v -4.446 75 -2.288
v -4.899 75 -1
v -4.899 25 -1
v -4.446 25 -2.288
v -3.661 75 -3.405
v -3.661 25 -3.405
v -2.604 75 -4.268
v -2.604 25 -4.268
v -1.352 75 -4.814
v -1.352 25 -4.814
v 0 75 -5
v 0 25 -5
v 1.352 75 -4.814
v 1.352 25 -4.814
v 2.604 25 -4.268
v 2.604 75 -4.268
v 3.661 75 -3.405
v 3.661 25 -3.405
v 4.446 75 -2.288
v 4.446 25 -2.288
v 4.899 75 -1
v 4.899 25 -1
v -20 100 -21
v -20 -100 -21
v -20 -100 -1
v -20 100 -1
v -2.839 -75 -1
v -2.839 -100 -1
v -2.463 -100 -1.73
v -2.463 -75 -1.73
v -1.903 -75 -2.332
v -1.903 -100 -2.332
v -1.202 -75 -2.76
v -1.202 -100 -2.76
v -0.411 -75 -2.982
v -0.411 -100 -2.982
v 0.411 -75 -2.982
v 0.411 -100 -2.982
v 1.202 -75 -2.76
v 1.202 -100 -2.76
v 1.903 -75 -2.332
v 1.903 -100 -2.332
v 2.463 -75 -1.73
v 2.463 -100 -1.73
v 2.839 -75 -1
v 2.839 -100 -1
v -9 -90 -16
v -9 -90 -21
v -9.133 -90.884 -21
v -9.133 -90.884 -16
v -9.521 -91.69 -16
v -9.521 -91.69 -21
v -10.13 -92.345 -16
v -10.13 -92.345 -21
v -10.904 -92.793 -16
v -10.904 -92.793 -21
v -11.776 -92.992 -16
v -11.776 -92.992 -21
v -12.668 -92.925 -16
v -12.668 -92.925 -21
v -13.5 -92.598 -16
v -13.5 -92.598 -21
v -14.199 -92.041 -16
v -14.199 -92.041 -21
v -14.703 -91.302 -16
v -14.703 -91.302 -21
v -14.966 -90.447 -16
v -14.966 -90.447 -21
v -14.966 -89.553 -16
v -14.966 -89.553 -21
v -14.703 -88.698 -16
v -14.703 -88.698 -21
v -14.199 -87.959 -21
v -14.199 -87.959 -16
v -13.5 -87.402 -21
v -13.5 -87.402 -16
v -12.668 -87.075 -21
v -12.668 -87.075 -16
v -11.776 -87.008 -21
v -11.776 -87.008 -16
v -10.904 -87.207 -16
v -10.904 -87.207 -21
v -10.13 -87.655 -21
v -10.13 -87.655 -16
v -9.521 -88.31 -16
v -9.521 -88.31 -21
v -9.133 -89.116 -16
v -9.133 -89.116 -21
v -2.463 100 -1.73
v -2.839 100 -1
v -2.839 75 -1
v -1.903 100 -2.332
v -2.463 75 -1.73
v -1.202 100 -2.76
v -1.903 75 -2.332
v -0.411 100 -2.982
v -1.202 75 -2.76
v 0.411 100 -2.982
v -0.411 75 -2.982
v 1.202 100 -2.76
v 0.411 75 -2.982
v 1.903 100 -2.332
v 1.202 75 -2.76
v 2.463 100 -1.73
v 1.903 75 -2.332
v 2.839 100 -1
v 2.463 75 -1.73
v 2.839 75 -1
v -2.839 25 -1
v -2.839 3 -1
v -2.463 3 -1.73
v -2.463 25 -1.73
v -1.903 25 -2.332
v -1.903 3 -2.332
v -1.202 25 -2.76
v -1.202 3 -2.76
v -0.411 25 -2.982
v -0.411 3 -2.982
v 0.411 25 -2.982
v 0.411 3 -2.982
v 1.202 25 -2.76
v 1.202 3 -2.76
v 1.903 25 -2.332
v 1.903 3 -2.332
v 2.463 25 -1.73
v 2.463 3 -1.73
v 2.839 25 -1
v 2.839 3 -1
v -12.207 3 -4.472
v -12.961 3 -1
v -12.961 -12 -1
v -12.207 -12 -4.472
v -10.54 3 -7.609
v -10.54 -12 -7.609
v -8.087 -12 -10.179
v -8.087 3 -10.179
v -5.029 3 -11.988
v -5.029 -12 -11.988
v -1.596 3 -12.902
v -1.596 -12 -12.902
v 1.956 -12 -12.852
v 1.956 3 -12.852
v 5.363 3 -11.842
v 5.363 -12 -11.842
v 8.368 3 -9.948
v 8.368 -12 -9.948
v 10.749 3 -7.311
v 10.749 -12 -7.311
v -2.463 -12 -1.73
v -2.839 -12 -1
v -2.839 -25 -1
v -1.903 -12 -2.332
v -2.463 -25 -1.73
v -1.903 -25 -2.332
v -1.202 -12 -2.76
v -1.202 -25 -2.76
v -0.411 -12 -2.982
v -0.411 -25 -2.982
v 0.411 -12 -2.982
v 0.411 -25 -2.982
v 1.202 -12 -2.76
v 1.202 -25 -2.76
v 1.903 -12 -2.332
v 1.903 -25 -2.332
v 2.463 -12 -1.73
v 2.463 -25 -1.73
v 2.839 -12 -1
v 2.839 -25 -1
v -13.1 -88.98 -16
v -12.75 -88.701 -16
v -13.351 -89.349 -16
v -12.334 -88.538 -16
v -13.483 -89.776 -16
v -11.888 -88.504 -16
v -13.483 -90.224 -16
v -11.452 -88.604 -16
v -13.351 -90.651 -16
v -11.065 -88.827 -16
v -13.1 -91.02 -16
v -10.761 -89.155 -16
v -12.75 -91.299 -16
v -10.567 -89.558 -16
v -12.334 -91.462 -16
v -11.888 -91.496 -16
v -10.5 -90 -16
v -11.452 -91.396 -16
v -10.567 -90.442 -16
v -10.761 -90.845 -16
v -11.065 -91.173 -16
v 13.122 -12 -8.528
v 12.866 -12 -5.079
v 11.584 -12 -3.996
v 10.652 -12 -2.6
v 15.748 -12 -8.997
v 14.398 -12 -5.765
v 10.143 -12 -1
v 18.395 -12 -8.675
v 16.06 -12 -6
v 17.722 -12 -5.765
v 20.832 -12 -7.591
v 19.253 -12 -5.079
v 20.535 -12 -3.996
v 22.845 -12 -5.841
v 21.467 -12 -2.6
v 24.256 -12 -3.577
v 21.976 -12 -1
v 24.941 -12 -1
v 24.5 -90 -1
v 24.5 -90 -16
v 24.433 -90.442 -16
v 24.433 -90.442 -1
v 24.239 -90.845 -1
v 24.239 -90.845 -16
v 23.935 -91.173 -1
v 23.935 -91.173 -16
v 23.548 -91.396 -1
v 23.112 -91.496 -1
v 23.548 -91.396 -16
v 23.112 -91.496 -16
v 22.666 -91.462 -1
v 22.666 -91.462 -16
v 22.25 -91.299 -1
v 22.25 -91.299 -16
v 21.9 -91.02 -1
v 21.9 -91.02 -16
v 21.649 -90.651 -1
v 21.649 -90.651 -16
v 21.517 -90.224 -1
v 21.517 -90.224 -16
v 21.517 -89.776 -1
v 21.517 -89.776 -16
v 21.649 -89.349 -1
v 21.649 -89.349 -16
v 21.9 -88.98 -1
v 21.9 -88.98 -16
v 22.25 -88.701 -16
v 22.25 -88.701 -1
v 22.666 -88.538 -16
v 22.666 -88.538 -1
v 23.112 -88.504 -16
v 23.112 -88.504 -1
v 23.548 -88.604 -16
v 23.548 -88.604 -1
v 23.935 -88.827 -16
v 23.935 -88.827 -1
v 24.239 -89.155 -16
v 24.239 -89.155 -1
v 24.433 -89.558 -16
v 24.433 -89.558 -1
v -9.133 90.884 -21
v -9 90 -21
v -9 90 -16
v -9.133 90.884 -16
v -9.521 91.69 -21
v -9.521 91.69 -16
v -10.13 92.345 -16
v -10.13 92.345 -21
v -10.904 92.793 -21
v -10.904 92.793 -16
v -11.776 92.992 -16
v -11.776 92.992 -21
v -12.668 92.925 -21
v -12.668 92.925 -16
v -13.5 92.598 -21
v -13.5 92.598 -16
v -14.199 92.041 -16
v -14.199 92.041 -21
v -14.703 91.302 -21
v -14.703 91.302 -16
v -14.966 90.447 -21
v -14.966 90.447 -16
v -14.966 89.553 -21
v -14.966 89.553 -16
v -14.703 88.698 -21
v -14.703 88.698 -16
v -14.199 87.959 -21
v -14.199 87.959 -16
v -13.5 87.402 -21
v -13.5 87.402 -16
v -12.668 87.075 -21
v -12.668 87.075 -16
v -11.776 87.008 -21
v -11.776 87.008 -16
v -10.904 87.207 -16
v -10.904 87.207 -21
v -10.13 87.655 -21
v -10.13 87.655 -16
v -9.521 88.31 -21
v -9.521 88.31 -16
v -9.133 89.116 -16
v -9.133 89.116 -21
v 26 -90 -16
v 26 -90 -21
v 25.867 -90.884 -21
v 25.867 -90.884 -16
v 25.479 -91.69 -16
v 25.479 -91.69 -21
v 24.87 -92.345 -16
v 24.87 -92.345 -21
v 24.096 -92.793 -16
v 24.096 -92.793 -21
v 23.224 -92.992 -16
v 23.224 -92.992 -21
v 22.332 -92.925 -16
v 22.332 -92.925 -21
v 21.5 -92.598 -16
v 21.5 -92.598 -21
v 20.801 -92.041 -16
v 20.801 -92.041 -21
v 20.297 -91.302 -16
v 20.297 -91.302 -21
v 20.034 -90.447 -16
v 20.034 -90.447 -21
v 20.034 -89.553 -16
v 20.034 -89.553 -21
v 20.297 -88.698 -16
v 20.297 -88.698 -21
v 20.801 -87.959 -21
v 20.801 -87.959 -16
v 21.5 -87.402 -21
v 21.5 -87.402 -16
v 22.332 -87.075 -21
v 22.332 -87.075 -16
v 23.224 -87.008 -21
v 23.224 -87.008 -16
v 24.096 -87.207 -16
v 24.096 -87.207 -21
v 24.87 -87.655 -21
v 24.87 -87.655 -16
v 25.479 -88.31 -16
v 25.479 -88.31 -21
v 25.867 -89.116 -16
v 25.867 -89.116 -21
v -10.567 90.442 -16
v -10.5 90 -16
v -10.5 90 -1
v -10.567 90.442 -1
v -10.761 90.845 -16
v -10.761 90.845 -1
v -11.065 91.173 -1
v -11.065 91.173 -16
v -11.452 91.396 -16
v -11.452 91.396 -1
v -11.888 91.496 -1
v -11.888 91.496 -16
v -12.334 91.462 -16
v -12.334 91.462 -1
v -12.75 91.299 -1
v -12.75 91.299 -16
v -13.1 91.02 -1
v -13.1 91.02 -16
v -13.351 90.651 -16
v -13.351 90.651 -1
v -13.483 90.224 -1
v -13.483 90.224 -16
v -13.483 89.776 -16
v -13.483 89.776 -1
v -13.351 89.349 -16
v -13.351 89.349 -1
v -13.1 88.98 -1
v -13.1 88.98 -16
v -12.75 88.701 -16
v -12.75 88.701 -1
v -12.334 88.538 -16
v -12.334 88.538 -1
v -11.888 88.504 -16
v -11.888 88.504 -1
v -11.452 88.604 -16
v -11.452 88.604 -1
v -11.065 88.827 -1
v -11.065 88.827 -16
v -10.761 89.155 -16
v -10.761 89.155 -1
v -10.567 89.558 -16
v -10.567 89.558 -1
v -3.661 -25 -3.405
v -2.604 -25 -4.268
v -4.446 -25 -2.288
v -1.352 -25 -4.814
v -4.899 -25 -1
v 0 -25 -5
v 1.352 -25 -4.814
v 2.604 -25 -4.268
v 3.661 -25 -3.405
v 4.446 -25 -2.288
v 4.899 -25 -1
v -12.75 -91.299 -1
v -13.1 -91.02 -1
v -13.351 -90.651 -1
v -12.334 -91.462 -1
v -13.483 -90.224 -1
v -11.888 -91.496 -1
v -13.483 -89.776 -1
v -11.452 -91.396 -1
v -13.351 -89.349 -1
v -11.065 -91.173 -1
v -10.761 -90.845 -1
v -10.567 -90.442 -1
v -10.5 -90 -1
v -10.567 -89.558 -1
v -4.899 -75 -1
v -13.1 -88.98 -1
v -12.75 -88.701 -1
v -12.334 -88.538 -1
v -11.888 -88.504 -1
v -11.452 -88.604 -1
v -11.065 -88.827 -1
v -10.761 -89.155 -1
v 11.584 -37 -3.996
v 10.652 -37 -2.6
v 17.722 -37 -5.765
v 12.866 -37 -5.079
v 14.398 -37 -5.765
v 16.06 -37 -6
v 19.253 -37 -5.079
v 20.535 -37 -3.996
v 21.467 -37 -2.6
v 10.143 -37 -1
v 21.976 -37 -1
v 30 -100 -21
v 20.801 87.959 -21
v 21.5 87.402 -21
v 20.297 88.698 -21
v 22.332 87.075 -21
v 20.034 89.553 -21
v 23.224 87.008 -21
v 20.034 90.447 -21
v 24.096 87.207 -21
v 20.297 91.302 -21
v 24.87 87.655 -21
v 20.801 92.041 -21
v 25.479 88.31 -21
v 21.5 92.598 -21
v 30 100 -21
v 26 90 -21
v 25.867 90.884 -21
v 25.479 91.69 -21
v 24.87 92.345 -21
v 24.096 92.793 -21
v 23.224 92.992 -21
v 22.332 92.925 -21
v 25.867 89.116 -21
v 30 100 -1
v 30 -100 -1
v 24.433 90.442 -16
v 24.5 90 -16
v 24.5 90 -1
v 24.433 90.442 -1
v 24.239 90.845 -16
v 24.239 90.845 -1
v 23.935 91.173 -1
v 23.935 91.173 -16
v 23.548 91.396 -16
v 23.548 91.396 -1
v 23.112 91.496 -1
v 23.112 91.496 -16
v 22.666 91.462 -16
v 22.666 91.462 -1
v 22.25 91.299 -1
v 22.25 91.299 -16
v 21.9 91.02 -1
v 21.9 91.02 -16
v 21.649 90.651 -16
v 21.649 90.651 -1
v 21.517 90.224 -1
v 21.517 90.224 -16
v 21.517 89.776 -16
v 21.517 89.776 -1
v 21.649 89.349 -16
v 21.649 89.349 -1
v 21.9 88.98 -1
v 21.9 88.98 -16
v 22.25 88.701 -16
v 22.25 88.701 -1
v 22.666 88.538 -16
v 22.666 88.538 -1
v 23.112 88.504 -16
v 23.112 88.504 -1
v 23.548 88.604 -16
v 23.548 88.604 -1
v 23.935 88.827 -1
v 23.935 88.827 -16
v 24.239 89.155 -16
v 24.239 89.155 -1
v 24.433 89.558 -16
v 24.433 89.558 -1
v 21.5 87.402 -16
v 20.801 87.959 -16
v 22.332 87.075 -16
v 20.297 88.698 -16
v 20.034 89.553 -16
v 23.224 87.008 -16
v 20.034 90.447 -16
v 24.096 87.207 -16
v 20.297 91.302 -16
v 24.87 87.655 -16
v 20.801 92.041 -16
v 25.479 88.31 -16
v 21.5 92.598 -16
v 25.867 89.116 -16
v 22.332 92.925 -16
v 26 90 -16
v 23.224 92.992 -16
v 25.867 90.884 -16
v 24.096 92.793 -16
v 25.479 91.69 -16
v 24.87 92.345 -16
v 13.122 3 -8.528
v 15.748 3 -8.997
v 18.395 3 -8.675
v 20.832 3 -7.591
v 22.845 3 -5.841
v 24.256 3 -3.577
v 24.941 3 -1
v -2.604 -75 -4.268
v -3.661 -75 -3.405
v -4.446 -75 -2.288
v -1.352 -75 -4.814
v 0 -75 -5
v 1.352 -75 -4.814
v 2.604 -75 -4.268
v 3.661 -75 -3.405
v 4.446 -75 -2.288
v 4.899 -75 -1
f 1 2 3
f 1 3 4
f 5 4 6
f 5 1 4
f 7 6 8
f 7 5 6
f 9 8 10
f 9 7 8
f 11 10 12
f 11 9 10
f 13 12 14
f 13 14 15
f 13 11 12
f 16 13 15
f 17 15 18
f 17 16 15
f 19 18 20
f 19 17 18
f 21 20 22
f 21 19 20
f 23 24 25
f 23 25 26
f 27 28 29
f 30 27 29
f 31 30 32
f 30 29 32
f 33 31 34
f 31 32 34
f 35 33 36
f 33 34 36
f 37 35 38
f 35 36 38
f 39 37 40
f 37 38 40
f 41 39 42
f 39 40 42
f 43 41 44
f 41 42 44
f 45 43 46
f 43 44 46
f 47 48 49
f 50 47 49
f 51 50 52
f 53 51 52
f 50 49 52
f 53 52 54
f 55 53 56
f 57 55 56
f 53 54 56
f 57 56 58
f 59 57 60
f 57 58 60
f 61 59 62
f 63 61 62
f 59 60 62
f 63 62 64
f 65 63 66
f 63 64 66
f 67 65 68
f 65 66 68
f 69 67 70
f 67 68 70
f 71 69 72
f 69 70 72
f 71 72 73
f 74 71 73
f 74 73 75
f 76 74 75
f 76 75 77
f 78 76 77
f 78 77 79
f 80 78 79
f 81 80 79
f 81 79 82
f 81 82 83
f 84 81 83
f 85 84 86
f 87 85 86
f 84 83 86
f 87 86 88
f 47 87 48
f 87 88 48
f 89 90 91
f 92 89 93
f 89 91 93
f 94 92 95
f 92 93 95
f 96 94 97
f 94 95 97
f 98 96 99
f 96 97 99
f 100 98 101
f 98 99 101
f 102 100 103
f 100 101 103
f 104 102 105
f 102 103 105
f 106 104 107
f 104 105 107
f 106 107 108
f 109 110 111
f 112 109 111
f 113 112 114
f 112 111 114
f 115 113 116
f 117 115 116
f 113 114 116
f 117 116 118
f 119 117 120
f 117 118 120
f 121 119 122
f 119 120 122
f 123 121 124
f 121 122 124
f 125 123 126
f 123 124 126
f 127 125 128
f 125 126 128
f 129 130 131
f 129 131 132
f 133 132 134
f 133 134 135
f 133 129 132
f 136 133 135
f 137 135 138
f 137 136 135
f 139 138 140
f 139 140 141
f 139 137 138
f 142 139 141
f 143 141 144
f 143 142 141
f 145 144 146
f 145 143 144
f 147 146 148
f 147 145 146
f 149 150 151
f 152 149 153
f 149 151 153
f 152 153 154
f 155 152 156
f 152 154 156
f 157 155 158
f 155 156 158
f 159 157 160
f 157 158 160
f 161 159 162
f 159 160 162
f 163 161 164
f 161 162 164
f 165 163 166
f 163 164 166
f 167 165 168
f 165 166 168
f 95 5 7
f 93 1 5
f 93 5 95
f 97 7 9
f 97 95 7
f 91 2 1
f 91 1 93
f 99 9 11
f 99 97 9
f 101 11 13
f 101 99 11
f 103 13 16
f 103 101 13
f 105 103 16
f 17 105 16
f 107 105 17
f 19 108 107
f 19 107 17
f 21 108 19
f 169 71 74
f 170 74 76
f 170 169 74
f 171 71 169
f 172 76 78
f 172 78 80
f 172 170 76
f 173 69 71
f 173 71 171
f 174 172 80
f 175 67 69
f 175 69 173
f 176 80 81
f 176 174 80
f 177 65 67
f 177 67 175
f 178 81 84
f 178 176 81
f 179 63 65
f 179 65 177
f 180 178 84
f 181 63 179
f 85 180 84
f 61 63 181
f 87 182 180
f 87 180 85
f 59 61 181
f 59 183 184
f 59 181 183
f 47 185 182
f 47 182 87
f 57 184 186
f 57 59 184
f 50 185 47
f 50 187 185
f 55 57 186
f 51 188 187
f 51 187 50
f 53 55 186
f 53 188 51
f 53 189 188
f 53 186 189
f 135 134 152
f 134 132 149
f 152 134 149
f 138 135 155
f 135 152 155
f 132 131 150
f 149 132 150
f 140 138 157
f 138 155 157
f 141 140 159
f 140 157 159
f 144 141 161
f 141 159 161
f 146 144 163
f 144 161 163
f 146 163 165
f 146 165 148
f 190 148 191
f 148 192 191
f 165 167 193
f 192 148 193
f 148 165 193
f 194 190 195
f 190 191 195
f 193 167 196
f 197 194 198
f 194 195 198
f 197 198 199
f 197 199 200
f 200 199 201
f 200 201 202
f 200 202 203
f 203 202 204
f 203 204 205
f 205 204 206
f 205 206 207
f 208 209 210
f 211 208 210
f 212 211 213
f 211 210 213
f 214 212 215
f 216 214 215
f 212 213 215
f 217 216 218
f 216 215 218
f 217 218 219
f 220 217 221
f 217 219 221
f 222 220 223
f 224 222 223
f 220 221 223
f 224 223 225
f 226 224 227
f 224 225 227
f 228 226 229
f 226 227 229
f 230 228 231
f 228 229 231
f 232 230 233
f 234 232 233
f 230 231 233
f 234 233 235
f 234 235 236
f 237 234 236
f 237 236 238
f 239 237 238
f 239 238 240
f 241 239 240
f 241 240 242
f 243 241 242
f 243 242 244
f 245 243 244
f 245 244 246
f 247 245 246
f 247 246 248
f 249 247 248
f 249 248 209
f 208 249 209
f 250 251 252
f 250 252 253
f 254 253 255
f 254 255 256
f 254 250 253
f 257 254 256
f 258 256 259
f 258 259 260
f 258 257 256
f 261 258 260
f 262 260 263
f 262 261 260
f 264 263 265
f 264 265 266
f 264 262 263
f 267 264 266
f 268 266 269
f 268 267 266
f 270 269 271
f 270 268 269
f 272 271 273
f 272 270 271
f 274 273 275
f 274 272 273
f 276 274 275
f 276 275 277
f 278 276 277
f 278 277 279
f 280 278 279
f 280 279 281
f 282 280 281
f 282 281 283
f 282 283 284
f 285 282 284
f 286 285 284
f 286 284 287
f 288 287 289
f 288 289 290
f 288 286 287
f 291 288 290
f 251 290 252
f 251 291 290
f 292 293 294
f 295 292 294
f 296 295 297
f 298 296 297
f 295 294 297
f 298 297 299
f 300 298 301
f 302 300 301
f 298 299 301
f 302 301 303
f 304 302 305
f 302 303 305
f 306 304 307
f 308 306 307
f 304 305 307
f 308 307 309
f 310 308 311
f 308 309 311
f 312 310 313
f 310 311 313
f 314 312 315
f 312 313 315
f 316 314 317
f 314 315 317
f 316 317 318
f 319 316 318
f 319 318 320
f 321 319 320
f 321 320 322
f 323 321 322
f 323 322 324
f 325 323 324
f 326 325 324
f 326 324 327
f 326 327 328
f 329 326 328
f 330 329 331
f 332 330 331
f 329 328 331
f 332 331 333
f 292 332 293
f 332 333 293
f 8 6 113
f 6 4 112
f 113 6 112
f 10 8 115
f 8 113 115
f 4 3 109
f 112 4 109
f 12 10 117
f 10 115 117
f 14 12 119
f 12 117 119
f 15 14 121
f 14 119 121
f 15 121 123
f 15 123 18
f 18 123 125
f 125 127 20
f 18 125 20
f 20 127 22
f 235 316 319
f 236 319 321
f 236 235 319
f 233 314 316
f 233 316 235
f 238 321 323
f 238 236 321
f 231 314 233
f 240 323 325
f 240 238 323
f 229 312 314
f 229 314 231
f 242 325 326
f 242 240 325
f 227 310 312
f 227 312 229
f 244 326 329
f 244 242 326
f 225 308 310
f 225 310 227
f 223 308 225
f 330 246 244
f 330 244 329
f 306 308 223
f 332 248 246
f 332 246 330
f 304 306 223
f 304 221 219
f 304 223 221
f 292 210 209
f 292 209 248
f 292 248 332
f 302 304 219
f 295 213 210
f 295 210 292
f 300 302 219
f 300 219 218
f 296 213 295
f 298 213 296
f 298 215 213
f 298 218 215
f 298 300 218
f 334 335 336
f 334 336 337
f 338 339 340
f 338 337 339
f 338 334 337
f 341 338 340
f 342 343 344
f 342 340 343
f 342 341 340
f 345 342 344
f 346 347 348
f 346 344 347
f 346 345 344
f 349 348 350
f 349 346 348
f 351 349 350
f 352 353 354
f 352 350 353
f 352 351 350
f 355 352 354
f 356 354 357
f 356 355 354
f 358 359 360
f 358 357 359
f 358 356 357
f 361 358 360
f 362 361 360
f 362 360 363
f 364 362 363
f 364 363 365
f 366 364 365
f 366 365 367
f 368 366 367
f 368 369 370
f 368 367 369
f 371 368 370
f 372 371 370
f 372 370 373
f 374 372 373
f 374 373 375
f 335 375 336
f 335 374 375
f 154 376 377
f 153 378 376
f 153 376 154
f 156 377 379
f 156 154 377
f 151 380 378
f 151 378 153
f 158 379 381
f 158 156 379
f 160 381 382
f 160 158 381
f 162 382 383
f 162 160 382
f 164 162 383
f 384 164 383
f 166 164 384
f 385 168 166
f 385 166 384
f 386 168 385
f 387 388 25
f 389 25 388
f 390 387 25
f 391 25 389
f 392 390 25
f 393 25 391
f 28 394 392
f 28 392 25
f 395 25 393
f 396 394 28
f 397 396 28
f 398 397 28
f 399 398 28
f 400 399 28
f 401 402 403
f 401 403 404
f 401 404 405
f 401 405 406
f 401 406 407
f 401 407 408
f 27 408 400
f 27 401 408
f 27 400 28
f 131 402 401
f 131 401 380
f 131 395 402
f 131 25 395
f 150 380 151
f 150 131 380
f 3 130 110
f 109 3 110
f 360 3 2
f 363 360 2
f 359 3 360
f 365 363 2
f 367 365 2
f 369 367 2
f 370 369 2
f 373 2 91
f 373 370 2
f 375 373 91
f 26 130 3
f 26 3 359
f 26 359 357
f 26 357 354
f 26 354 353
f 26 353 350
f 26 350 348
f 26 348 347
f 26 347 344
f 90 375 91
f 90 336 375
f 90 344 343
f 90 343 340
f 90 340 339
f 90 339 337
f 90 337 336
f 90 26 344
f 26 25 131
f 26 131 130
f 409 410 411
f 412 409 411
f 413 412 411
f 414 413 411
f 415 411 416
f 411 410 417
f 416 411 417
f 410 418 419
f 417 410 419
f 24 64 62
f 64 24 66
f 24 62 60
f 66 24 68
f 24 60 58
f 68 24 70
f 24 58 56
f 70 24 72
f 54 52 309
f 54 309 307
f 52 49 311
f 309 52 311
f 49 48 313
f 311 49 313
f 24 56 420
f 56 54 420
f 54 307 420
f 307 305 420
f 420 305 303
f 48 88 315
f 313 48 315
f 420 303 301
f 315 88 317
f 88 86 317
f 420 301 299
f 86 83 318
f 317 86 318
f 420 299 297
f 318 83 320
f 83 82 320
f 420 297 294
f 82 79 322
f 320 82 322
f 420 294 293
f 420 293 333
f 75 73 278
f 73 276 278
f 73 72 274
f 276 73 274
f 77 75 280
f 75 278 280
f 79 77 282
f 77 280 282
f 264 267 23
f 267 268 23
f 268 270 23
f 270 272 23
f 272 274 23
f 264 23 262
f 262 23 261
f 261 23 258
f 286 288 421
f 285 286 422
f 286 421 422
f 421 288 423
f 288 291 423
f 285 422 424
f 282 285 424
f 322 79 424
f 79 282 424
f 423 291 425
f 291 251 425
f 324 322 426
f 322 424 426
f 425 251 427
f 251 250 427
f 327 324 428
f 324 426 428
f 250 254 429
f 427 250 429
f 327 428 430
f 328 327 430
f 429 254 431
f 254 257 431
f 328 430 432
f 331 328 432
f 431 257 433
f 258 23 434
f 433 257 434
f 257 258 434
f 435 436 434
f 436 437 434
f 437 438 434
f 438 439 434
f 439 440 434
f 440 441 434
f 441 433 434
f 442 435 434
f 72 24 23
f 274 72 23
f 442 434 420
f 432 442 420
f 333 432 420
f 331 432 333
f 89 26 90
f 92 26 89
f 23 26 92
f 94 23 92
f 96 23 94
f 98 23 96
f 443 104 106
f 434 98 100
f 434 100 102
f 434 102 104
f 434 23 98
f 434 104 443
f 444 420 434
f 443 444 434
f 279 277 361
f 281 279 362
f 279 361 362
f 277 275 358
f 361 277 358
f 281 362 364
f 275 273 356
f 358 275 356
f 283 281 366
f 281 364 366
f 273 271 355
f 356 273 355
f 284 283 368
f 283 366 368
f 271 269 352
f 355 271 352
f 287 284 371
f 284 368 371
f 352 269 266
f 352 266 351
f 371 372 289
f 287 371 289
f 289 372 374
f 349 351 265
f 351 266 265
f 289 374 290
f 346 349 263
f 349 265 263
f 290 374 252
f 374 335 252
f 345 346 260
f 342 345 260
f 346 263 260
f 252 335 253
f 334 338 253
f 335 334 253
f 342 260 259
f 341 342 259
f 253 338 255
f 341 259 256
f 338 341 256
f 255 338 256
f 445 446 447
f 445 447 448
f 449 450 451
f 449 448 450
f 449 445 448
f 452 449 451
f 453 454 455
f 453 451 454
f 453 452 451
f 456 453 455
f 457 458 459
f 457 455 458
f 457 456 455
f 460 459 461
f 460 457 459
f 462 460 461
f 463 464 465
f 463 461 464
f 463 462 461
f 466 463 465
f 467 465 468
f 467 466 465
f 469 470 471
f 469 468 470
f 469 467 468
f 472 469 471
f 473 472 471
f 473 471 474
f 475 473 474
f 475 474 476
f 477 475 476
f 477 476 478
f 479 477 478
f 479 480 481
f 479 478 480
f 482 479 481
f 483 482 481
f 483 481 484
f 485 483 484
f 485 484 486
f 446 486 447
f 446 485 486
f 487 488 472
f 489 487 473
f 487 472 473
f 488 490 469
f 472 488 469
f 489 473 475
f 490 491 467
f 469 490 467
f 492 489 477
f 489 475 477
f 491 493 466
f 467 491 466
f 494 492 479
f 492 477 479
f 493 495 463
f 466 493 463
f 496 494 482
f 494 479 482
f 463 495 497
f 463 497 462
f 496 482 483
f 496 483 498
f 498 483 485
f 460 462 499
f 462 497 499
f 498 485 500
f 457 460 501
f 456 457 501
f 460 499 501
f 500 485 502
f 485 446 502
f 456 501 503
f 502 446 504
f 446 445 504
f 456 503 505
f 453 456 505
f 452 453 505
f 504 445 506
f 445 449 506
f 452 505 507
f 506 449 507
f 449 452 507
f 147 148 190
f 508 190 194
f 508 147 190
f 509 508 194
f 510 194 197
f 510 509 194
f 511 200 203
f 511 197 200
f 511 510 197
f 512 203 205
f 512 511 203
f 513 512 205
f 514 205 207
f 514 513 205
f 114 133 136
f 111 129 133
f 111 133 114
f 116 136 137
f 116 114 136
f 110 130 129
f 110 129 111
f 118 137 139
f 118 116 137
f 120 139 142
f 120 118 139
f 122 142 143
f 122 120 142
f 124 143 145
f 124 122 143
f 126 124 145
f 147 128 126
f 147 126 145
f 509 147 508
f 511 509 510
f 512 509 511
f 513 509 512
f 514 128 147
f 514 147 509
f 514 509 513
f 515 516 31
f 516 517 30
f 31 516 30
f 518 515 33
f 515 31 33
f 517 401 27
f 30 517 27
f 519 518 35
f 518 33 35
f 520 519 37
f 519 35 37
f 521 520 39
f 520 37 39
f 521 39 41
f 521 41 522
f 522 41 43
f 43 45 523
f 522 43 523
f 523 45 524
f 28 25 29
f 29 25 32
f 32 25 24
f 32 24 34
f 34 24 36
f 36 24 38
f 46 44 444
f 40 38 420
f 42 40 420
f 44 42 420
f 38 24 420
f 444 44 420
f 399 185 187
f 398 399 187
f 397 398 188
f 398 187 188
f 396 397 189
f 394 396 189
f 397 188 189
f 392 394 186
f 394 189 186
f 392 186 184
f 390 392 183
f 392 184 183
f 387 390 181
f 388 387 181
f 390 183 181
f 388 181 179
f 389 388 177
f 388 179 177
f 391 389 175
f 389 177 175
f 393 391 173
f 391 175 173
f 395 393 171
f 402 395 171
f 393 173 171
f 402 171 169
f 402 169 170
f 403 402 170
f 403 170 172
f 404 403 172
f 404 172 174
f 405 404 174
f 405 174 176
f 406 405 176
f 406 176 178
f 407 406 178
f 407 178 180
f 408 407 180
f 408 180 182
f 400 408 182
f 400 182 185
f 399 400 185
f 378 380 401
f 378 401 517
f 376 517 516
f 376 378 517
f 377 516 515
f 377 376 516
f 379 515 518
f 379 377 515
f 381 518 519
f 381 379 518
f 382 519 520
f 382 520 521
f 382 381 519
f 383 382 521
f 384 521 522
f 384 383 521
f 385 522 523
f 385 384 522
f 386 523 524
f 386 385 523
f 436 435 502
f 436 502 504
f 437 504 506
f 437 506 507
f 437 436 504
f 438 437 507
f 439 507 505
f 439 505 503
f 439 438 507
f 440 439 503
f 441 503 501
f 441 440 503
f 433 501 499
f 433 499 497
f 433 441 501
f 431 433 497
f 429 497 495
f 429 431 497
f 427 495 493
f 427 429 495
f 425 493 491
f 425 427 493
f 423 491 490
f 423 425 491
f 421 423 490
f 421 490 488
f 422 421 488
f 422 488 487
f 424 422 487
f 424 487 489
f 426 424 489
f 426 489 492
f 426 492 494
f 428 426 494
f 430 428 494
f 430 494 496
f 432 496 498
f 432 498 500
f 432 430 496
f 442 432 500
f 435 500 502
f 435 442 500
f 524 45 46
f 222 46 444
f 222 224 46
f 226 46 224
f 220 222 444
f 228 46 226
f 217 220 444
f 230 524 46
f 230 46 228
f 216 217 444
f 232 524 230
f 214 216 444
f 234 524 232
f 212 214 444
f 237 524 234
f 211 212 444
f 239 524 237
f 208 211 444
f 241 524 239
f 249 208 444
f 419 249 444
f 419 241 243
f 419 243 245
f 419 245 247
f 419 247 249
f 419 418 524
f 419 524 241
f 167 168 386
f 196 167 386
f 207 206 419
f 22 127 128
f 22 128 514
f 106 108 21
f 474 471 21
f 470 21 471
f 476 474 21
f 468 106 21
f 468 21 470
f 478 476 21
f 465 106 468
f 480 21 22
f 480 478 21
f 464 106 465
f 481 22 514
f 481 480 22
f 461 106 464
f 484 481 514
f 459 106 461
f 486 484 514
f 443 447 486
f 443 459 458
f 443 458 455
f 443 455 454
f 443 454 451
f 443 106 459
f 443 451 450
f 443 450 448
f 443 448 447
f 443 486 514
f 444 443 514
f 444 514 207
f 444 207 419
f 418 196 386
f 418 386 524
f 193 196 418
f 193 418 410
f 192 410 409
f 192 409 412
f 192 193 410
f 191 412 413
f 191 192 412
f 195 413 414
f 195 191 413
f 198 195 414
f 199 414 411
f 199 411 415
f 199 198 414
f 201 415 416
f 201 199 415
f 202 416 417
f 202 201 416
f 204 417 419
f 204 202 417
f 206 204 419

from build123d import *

# Parameters (mm, degrees)
SKETCH006_R     = 3.009992
PAD002_DEPTH    = 100
SKETCH011_R     = 5
PAD007_DEPTH    = 50
SKETCH010_R     = 5
PAD006_DEPTH    = 50
SKETCH008_R     = 13
PAD004_DEPTH    = 15
SKETCH009_R     = 9
PAD005_DEPTH    = 15
SKETCH013_R     = 6
PAD008_DEPTH    = 26
BOX001_W        = 50
BOX001_H        = 200
BOX001_DEPTH    = 20
SKETCH015_R     = 1.5
POCKET001_DEPTH = 434.247304
SKETCH016_R     = 1.5
POCKET002_DEPTH = 434.247304
SKETCH017_R     = 3
POCKET003_DEPTH = 5
SKETCH018_R     = 3
POCKET004_DEPTH = 5


with BuildPart() as pad002:
    # Sketch006 → Pad002 (new body, symmetric)
    with BuildSketch(Plane.XZ):
        Circle(SKETCH006_R)
    extrude(amount=PAD002_DEPTH, both=True)


with BuildPart() as pad007:
    # Sketch011 → Pad007 (new body)
    with BuildSketch(Plane.XZ.offset(-75)):
        Circle(SKETCH011_R)
    extrude(amount=PAD007_DEPTH)


with BuildPart() as scassi_perno:
    # Sketch010 → Pad006 (new body)
    with BuildSketch(Plane.XZ.offset(25)):
        Circle(SKETCH010_R)
    extrude(amount=PAD006_DEPTH)

    # Fusion002: union Pad007
    add(pad007.part)


with BuildPart() as scasso_ruota_dentata:
    # Sketch008 → Pad004 (new body)
    with BuildSketch(Plane.XZ.offset(-3)):
        Circle(SKETCH008_R)
    extrude(amount=PAD004_DEPTH)


with BuildPart() as scassi_ruote_dentate:
    # Sketch009 → Pad005 (new body)
    with BuildSketch(Plane.XZ.offset(-3)):
        with Locations((15.997087, 9e-06)):
            Circle(SKETCH009_R)
    extrude(amount=PAD005_DEPTH)

    # Fusion001: union scasso_ruota_dentata
    add(scasso_ruota_dentata.part)


with BuildPart() as fusion:
    # Sketch013 → Pad008 (new body)
    with BuildSketch(Plane.XZ.offset(11)):
        with Locations((16.059561, 9e-06)):
            Circle(SKETCH013_R)
    extrude(amount=PAD008_DEPTH)

    # Fusion005: union scassi_perno, scassi_ruote_dentate
    add(scassi_perno.part)
    add(scassi_ruote_dentate.part)

    # Fusion: union Pad002
    add(pad002.part)


with BuildPart() as tappo_viti:
    # Box001 → Box001 (new body)
    with BuildSketch(Plane(origin=(-20, -100, -21), x_dir=(1, 0, 0), z_dir=(0, 0, 1))):
        with Locations((25, 100)):
            Rectangle(BOX001_W, BOX001_H)
    extrude(amount=BOX001_DEPTH)

    # Cut001: cut Fusion
    add(fusion.part, mode=Mode.SUBTRACT)

    # Sketch015 → Pocket001 (cut, through all)
    with BuildSketch(Plane(origin=(0, 0, -21), x_dir=(1, 0, 0), z_dir=(0, 0, -1))):
        with Locations((23, 90)):
            Circle(SKETCH015_R)
    pocket001 = extrude(amount=-POCKET001_DEPTH, mode=Mode.SUBTRACT)

    # Mirrored: Pocket001 across Sketch015 H_Axis
    add(pocket001.mirror(Plane(origin=(0, 0, -21), x_dir=(0, 0, -1), z_dir=(0, -1, 0))), mode=Mode.SUBTRACT)

    # Sketch016 → Pocket002 (cut, through all)
    with BuildSketch(Plane(origin=(0, 0, -21), x_dir=(1, 0, 0), z_dir=(0, 0, -1))):
        with Locations((-12, 90)):
            Circle(SKETCH016_R)
    pocket002 = extrude(amount=-POCKET002_DEPTH, mode=Mode.SUBTRACT)

    # Mirrored001: Pocket002 across Sketch016 H_Axis
    add(pocket002.mirror(Plane(origin=(0, 0, -21), x_dir=(0, 0, -1), z_dir=(0, -1, 0))), mode=Mode.SUBTRACT)

    # Sketch017 → Pocket003 (cut)
    with BuildSketch(Plane(origin=(0, 0, -21), x_dir=(1, 0, 0), z_dir=(0, 0, -1))):
        with Locations((23, 90)):
            Circle(SKETCH017_R)
    pocket003 = extrude(amount=-POCKET003_DEPTH, mode=Mode.SUBTRACT)

    # Mirrored002: Pocket003 across Sketch017 H_Axis
    add(pocket003.mirror(Plane(origin=(0, 0, -21), x_dir=(0, 0, -1), z_dir=(0, -1, 0))), mode=Mode.SUBTRACT)

    # Sketch018 → Pocket004 (cut)
    with BuildSketch(Plane(origin=(0, 0, -21), x_dir=(1, 0, 0), z_dir=(0, 0, -1))):
        with Locations((-12, 90)):
            Circle(SKETCH018_R)
    pocket004 = extrude(amount=-POCKET004_DEPTH, mode=Mode.SUBTRACT)

    # Mirrored003: Pocket004 across Sketch018 H_Axis
    add(pocket004.mirror(Plane(origin=(0, 0, -21), x_dir=(0, 0, -1), z_dir=(0, -1, 0))), mode=Mode.SUBTRACT)


solid = tappo_viti.part
